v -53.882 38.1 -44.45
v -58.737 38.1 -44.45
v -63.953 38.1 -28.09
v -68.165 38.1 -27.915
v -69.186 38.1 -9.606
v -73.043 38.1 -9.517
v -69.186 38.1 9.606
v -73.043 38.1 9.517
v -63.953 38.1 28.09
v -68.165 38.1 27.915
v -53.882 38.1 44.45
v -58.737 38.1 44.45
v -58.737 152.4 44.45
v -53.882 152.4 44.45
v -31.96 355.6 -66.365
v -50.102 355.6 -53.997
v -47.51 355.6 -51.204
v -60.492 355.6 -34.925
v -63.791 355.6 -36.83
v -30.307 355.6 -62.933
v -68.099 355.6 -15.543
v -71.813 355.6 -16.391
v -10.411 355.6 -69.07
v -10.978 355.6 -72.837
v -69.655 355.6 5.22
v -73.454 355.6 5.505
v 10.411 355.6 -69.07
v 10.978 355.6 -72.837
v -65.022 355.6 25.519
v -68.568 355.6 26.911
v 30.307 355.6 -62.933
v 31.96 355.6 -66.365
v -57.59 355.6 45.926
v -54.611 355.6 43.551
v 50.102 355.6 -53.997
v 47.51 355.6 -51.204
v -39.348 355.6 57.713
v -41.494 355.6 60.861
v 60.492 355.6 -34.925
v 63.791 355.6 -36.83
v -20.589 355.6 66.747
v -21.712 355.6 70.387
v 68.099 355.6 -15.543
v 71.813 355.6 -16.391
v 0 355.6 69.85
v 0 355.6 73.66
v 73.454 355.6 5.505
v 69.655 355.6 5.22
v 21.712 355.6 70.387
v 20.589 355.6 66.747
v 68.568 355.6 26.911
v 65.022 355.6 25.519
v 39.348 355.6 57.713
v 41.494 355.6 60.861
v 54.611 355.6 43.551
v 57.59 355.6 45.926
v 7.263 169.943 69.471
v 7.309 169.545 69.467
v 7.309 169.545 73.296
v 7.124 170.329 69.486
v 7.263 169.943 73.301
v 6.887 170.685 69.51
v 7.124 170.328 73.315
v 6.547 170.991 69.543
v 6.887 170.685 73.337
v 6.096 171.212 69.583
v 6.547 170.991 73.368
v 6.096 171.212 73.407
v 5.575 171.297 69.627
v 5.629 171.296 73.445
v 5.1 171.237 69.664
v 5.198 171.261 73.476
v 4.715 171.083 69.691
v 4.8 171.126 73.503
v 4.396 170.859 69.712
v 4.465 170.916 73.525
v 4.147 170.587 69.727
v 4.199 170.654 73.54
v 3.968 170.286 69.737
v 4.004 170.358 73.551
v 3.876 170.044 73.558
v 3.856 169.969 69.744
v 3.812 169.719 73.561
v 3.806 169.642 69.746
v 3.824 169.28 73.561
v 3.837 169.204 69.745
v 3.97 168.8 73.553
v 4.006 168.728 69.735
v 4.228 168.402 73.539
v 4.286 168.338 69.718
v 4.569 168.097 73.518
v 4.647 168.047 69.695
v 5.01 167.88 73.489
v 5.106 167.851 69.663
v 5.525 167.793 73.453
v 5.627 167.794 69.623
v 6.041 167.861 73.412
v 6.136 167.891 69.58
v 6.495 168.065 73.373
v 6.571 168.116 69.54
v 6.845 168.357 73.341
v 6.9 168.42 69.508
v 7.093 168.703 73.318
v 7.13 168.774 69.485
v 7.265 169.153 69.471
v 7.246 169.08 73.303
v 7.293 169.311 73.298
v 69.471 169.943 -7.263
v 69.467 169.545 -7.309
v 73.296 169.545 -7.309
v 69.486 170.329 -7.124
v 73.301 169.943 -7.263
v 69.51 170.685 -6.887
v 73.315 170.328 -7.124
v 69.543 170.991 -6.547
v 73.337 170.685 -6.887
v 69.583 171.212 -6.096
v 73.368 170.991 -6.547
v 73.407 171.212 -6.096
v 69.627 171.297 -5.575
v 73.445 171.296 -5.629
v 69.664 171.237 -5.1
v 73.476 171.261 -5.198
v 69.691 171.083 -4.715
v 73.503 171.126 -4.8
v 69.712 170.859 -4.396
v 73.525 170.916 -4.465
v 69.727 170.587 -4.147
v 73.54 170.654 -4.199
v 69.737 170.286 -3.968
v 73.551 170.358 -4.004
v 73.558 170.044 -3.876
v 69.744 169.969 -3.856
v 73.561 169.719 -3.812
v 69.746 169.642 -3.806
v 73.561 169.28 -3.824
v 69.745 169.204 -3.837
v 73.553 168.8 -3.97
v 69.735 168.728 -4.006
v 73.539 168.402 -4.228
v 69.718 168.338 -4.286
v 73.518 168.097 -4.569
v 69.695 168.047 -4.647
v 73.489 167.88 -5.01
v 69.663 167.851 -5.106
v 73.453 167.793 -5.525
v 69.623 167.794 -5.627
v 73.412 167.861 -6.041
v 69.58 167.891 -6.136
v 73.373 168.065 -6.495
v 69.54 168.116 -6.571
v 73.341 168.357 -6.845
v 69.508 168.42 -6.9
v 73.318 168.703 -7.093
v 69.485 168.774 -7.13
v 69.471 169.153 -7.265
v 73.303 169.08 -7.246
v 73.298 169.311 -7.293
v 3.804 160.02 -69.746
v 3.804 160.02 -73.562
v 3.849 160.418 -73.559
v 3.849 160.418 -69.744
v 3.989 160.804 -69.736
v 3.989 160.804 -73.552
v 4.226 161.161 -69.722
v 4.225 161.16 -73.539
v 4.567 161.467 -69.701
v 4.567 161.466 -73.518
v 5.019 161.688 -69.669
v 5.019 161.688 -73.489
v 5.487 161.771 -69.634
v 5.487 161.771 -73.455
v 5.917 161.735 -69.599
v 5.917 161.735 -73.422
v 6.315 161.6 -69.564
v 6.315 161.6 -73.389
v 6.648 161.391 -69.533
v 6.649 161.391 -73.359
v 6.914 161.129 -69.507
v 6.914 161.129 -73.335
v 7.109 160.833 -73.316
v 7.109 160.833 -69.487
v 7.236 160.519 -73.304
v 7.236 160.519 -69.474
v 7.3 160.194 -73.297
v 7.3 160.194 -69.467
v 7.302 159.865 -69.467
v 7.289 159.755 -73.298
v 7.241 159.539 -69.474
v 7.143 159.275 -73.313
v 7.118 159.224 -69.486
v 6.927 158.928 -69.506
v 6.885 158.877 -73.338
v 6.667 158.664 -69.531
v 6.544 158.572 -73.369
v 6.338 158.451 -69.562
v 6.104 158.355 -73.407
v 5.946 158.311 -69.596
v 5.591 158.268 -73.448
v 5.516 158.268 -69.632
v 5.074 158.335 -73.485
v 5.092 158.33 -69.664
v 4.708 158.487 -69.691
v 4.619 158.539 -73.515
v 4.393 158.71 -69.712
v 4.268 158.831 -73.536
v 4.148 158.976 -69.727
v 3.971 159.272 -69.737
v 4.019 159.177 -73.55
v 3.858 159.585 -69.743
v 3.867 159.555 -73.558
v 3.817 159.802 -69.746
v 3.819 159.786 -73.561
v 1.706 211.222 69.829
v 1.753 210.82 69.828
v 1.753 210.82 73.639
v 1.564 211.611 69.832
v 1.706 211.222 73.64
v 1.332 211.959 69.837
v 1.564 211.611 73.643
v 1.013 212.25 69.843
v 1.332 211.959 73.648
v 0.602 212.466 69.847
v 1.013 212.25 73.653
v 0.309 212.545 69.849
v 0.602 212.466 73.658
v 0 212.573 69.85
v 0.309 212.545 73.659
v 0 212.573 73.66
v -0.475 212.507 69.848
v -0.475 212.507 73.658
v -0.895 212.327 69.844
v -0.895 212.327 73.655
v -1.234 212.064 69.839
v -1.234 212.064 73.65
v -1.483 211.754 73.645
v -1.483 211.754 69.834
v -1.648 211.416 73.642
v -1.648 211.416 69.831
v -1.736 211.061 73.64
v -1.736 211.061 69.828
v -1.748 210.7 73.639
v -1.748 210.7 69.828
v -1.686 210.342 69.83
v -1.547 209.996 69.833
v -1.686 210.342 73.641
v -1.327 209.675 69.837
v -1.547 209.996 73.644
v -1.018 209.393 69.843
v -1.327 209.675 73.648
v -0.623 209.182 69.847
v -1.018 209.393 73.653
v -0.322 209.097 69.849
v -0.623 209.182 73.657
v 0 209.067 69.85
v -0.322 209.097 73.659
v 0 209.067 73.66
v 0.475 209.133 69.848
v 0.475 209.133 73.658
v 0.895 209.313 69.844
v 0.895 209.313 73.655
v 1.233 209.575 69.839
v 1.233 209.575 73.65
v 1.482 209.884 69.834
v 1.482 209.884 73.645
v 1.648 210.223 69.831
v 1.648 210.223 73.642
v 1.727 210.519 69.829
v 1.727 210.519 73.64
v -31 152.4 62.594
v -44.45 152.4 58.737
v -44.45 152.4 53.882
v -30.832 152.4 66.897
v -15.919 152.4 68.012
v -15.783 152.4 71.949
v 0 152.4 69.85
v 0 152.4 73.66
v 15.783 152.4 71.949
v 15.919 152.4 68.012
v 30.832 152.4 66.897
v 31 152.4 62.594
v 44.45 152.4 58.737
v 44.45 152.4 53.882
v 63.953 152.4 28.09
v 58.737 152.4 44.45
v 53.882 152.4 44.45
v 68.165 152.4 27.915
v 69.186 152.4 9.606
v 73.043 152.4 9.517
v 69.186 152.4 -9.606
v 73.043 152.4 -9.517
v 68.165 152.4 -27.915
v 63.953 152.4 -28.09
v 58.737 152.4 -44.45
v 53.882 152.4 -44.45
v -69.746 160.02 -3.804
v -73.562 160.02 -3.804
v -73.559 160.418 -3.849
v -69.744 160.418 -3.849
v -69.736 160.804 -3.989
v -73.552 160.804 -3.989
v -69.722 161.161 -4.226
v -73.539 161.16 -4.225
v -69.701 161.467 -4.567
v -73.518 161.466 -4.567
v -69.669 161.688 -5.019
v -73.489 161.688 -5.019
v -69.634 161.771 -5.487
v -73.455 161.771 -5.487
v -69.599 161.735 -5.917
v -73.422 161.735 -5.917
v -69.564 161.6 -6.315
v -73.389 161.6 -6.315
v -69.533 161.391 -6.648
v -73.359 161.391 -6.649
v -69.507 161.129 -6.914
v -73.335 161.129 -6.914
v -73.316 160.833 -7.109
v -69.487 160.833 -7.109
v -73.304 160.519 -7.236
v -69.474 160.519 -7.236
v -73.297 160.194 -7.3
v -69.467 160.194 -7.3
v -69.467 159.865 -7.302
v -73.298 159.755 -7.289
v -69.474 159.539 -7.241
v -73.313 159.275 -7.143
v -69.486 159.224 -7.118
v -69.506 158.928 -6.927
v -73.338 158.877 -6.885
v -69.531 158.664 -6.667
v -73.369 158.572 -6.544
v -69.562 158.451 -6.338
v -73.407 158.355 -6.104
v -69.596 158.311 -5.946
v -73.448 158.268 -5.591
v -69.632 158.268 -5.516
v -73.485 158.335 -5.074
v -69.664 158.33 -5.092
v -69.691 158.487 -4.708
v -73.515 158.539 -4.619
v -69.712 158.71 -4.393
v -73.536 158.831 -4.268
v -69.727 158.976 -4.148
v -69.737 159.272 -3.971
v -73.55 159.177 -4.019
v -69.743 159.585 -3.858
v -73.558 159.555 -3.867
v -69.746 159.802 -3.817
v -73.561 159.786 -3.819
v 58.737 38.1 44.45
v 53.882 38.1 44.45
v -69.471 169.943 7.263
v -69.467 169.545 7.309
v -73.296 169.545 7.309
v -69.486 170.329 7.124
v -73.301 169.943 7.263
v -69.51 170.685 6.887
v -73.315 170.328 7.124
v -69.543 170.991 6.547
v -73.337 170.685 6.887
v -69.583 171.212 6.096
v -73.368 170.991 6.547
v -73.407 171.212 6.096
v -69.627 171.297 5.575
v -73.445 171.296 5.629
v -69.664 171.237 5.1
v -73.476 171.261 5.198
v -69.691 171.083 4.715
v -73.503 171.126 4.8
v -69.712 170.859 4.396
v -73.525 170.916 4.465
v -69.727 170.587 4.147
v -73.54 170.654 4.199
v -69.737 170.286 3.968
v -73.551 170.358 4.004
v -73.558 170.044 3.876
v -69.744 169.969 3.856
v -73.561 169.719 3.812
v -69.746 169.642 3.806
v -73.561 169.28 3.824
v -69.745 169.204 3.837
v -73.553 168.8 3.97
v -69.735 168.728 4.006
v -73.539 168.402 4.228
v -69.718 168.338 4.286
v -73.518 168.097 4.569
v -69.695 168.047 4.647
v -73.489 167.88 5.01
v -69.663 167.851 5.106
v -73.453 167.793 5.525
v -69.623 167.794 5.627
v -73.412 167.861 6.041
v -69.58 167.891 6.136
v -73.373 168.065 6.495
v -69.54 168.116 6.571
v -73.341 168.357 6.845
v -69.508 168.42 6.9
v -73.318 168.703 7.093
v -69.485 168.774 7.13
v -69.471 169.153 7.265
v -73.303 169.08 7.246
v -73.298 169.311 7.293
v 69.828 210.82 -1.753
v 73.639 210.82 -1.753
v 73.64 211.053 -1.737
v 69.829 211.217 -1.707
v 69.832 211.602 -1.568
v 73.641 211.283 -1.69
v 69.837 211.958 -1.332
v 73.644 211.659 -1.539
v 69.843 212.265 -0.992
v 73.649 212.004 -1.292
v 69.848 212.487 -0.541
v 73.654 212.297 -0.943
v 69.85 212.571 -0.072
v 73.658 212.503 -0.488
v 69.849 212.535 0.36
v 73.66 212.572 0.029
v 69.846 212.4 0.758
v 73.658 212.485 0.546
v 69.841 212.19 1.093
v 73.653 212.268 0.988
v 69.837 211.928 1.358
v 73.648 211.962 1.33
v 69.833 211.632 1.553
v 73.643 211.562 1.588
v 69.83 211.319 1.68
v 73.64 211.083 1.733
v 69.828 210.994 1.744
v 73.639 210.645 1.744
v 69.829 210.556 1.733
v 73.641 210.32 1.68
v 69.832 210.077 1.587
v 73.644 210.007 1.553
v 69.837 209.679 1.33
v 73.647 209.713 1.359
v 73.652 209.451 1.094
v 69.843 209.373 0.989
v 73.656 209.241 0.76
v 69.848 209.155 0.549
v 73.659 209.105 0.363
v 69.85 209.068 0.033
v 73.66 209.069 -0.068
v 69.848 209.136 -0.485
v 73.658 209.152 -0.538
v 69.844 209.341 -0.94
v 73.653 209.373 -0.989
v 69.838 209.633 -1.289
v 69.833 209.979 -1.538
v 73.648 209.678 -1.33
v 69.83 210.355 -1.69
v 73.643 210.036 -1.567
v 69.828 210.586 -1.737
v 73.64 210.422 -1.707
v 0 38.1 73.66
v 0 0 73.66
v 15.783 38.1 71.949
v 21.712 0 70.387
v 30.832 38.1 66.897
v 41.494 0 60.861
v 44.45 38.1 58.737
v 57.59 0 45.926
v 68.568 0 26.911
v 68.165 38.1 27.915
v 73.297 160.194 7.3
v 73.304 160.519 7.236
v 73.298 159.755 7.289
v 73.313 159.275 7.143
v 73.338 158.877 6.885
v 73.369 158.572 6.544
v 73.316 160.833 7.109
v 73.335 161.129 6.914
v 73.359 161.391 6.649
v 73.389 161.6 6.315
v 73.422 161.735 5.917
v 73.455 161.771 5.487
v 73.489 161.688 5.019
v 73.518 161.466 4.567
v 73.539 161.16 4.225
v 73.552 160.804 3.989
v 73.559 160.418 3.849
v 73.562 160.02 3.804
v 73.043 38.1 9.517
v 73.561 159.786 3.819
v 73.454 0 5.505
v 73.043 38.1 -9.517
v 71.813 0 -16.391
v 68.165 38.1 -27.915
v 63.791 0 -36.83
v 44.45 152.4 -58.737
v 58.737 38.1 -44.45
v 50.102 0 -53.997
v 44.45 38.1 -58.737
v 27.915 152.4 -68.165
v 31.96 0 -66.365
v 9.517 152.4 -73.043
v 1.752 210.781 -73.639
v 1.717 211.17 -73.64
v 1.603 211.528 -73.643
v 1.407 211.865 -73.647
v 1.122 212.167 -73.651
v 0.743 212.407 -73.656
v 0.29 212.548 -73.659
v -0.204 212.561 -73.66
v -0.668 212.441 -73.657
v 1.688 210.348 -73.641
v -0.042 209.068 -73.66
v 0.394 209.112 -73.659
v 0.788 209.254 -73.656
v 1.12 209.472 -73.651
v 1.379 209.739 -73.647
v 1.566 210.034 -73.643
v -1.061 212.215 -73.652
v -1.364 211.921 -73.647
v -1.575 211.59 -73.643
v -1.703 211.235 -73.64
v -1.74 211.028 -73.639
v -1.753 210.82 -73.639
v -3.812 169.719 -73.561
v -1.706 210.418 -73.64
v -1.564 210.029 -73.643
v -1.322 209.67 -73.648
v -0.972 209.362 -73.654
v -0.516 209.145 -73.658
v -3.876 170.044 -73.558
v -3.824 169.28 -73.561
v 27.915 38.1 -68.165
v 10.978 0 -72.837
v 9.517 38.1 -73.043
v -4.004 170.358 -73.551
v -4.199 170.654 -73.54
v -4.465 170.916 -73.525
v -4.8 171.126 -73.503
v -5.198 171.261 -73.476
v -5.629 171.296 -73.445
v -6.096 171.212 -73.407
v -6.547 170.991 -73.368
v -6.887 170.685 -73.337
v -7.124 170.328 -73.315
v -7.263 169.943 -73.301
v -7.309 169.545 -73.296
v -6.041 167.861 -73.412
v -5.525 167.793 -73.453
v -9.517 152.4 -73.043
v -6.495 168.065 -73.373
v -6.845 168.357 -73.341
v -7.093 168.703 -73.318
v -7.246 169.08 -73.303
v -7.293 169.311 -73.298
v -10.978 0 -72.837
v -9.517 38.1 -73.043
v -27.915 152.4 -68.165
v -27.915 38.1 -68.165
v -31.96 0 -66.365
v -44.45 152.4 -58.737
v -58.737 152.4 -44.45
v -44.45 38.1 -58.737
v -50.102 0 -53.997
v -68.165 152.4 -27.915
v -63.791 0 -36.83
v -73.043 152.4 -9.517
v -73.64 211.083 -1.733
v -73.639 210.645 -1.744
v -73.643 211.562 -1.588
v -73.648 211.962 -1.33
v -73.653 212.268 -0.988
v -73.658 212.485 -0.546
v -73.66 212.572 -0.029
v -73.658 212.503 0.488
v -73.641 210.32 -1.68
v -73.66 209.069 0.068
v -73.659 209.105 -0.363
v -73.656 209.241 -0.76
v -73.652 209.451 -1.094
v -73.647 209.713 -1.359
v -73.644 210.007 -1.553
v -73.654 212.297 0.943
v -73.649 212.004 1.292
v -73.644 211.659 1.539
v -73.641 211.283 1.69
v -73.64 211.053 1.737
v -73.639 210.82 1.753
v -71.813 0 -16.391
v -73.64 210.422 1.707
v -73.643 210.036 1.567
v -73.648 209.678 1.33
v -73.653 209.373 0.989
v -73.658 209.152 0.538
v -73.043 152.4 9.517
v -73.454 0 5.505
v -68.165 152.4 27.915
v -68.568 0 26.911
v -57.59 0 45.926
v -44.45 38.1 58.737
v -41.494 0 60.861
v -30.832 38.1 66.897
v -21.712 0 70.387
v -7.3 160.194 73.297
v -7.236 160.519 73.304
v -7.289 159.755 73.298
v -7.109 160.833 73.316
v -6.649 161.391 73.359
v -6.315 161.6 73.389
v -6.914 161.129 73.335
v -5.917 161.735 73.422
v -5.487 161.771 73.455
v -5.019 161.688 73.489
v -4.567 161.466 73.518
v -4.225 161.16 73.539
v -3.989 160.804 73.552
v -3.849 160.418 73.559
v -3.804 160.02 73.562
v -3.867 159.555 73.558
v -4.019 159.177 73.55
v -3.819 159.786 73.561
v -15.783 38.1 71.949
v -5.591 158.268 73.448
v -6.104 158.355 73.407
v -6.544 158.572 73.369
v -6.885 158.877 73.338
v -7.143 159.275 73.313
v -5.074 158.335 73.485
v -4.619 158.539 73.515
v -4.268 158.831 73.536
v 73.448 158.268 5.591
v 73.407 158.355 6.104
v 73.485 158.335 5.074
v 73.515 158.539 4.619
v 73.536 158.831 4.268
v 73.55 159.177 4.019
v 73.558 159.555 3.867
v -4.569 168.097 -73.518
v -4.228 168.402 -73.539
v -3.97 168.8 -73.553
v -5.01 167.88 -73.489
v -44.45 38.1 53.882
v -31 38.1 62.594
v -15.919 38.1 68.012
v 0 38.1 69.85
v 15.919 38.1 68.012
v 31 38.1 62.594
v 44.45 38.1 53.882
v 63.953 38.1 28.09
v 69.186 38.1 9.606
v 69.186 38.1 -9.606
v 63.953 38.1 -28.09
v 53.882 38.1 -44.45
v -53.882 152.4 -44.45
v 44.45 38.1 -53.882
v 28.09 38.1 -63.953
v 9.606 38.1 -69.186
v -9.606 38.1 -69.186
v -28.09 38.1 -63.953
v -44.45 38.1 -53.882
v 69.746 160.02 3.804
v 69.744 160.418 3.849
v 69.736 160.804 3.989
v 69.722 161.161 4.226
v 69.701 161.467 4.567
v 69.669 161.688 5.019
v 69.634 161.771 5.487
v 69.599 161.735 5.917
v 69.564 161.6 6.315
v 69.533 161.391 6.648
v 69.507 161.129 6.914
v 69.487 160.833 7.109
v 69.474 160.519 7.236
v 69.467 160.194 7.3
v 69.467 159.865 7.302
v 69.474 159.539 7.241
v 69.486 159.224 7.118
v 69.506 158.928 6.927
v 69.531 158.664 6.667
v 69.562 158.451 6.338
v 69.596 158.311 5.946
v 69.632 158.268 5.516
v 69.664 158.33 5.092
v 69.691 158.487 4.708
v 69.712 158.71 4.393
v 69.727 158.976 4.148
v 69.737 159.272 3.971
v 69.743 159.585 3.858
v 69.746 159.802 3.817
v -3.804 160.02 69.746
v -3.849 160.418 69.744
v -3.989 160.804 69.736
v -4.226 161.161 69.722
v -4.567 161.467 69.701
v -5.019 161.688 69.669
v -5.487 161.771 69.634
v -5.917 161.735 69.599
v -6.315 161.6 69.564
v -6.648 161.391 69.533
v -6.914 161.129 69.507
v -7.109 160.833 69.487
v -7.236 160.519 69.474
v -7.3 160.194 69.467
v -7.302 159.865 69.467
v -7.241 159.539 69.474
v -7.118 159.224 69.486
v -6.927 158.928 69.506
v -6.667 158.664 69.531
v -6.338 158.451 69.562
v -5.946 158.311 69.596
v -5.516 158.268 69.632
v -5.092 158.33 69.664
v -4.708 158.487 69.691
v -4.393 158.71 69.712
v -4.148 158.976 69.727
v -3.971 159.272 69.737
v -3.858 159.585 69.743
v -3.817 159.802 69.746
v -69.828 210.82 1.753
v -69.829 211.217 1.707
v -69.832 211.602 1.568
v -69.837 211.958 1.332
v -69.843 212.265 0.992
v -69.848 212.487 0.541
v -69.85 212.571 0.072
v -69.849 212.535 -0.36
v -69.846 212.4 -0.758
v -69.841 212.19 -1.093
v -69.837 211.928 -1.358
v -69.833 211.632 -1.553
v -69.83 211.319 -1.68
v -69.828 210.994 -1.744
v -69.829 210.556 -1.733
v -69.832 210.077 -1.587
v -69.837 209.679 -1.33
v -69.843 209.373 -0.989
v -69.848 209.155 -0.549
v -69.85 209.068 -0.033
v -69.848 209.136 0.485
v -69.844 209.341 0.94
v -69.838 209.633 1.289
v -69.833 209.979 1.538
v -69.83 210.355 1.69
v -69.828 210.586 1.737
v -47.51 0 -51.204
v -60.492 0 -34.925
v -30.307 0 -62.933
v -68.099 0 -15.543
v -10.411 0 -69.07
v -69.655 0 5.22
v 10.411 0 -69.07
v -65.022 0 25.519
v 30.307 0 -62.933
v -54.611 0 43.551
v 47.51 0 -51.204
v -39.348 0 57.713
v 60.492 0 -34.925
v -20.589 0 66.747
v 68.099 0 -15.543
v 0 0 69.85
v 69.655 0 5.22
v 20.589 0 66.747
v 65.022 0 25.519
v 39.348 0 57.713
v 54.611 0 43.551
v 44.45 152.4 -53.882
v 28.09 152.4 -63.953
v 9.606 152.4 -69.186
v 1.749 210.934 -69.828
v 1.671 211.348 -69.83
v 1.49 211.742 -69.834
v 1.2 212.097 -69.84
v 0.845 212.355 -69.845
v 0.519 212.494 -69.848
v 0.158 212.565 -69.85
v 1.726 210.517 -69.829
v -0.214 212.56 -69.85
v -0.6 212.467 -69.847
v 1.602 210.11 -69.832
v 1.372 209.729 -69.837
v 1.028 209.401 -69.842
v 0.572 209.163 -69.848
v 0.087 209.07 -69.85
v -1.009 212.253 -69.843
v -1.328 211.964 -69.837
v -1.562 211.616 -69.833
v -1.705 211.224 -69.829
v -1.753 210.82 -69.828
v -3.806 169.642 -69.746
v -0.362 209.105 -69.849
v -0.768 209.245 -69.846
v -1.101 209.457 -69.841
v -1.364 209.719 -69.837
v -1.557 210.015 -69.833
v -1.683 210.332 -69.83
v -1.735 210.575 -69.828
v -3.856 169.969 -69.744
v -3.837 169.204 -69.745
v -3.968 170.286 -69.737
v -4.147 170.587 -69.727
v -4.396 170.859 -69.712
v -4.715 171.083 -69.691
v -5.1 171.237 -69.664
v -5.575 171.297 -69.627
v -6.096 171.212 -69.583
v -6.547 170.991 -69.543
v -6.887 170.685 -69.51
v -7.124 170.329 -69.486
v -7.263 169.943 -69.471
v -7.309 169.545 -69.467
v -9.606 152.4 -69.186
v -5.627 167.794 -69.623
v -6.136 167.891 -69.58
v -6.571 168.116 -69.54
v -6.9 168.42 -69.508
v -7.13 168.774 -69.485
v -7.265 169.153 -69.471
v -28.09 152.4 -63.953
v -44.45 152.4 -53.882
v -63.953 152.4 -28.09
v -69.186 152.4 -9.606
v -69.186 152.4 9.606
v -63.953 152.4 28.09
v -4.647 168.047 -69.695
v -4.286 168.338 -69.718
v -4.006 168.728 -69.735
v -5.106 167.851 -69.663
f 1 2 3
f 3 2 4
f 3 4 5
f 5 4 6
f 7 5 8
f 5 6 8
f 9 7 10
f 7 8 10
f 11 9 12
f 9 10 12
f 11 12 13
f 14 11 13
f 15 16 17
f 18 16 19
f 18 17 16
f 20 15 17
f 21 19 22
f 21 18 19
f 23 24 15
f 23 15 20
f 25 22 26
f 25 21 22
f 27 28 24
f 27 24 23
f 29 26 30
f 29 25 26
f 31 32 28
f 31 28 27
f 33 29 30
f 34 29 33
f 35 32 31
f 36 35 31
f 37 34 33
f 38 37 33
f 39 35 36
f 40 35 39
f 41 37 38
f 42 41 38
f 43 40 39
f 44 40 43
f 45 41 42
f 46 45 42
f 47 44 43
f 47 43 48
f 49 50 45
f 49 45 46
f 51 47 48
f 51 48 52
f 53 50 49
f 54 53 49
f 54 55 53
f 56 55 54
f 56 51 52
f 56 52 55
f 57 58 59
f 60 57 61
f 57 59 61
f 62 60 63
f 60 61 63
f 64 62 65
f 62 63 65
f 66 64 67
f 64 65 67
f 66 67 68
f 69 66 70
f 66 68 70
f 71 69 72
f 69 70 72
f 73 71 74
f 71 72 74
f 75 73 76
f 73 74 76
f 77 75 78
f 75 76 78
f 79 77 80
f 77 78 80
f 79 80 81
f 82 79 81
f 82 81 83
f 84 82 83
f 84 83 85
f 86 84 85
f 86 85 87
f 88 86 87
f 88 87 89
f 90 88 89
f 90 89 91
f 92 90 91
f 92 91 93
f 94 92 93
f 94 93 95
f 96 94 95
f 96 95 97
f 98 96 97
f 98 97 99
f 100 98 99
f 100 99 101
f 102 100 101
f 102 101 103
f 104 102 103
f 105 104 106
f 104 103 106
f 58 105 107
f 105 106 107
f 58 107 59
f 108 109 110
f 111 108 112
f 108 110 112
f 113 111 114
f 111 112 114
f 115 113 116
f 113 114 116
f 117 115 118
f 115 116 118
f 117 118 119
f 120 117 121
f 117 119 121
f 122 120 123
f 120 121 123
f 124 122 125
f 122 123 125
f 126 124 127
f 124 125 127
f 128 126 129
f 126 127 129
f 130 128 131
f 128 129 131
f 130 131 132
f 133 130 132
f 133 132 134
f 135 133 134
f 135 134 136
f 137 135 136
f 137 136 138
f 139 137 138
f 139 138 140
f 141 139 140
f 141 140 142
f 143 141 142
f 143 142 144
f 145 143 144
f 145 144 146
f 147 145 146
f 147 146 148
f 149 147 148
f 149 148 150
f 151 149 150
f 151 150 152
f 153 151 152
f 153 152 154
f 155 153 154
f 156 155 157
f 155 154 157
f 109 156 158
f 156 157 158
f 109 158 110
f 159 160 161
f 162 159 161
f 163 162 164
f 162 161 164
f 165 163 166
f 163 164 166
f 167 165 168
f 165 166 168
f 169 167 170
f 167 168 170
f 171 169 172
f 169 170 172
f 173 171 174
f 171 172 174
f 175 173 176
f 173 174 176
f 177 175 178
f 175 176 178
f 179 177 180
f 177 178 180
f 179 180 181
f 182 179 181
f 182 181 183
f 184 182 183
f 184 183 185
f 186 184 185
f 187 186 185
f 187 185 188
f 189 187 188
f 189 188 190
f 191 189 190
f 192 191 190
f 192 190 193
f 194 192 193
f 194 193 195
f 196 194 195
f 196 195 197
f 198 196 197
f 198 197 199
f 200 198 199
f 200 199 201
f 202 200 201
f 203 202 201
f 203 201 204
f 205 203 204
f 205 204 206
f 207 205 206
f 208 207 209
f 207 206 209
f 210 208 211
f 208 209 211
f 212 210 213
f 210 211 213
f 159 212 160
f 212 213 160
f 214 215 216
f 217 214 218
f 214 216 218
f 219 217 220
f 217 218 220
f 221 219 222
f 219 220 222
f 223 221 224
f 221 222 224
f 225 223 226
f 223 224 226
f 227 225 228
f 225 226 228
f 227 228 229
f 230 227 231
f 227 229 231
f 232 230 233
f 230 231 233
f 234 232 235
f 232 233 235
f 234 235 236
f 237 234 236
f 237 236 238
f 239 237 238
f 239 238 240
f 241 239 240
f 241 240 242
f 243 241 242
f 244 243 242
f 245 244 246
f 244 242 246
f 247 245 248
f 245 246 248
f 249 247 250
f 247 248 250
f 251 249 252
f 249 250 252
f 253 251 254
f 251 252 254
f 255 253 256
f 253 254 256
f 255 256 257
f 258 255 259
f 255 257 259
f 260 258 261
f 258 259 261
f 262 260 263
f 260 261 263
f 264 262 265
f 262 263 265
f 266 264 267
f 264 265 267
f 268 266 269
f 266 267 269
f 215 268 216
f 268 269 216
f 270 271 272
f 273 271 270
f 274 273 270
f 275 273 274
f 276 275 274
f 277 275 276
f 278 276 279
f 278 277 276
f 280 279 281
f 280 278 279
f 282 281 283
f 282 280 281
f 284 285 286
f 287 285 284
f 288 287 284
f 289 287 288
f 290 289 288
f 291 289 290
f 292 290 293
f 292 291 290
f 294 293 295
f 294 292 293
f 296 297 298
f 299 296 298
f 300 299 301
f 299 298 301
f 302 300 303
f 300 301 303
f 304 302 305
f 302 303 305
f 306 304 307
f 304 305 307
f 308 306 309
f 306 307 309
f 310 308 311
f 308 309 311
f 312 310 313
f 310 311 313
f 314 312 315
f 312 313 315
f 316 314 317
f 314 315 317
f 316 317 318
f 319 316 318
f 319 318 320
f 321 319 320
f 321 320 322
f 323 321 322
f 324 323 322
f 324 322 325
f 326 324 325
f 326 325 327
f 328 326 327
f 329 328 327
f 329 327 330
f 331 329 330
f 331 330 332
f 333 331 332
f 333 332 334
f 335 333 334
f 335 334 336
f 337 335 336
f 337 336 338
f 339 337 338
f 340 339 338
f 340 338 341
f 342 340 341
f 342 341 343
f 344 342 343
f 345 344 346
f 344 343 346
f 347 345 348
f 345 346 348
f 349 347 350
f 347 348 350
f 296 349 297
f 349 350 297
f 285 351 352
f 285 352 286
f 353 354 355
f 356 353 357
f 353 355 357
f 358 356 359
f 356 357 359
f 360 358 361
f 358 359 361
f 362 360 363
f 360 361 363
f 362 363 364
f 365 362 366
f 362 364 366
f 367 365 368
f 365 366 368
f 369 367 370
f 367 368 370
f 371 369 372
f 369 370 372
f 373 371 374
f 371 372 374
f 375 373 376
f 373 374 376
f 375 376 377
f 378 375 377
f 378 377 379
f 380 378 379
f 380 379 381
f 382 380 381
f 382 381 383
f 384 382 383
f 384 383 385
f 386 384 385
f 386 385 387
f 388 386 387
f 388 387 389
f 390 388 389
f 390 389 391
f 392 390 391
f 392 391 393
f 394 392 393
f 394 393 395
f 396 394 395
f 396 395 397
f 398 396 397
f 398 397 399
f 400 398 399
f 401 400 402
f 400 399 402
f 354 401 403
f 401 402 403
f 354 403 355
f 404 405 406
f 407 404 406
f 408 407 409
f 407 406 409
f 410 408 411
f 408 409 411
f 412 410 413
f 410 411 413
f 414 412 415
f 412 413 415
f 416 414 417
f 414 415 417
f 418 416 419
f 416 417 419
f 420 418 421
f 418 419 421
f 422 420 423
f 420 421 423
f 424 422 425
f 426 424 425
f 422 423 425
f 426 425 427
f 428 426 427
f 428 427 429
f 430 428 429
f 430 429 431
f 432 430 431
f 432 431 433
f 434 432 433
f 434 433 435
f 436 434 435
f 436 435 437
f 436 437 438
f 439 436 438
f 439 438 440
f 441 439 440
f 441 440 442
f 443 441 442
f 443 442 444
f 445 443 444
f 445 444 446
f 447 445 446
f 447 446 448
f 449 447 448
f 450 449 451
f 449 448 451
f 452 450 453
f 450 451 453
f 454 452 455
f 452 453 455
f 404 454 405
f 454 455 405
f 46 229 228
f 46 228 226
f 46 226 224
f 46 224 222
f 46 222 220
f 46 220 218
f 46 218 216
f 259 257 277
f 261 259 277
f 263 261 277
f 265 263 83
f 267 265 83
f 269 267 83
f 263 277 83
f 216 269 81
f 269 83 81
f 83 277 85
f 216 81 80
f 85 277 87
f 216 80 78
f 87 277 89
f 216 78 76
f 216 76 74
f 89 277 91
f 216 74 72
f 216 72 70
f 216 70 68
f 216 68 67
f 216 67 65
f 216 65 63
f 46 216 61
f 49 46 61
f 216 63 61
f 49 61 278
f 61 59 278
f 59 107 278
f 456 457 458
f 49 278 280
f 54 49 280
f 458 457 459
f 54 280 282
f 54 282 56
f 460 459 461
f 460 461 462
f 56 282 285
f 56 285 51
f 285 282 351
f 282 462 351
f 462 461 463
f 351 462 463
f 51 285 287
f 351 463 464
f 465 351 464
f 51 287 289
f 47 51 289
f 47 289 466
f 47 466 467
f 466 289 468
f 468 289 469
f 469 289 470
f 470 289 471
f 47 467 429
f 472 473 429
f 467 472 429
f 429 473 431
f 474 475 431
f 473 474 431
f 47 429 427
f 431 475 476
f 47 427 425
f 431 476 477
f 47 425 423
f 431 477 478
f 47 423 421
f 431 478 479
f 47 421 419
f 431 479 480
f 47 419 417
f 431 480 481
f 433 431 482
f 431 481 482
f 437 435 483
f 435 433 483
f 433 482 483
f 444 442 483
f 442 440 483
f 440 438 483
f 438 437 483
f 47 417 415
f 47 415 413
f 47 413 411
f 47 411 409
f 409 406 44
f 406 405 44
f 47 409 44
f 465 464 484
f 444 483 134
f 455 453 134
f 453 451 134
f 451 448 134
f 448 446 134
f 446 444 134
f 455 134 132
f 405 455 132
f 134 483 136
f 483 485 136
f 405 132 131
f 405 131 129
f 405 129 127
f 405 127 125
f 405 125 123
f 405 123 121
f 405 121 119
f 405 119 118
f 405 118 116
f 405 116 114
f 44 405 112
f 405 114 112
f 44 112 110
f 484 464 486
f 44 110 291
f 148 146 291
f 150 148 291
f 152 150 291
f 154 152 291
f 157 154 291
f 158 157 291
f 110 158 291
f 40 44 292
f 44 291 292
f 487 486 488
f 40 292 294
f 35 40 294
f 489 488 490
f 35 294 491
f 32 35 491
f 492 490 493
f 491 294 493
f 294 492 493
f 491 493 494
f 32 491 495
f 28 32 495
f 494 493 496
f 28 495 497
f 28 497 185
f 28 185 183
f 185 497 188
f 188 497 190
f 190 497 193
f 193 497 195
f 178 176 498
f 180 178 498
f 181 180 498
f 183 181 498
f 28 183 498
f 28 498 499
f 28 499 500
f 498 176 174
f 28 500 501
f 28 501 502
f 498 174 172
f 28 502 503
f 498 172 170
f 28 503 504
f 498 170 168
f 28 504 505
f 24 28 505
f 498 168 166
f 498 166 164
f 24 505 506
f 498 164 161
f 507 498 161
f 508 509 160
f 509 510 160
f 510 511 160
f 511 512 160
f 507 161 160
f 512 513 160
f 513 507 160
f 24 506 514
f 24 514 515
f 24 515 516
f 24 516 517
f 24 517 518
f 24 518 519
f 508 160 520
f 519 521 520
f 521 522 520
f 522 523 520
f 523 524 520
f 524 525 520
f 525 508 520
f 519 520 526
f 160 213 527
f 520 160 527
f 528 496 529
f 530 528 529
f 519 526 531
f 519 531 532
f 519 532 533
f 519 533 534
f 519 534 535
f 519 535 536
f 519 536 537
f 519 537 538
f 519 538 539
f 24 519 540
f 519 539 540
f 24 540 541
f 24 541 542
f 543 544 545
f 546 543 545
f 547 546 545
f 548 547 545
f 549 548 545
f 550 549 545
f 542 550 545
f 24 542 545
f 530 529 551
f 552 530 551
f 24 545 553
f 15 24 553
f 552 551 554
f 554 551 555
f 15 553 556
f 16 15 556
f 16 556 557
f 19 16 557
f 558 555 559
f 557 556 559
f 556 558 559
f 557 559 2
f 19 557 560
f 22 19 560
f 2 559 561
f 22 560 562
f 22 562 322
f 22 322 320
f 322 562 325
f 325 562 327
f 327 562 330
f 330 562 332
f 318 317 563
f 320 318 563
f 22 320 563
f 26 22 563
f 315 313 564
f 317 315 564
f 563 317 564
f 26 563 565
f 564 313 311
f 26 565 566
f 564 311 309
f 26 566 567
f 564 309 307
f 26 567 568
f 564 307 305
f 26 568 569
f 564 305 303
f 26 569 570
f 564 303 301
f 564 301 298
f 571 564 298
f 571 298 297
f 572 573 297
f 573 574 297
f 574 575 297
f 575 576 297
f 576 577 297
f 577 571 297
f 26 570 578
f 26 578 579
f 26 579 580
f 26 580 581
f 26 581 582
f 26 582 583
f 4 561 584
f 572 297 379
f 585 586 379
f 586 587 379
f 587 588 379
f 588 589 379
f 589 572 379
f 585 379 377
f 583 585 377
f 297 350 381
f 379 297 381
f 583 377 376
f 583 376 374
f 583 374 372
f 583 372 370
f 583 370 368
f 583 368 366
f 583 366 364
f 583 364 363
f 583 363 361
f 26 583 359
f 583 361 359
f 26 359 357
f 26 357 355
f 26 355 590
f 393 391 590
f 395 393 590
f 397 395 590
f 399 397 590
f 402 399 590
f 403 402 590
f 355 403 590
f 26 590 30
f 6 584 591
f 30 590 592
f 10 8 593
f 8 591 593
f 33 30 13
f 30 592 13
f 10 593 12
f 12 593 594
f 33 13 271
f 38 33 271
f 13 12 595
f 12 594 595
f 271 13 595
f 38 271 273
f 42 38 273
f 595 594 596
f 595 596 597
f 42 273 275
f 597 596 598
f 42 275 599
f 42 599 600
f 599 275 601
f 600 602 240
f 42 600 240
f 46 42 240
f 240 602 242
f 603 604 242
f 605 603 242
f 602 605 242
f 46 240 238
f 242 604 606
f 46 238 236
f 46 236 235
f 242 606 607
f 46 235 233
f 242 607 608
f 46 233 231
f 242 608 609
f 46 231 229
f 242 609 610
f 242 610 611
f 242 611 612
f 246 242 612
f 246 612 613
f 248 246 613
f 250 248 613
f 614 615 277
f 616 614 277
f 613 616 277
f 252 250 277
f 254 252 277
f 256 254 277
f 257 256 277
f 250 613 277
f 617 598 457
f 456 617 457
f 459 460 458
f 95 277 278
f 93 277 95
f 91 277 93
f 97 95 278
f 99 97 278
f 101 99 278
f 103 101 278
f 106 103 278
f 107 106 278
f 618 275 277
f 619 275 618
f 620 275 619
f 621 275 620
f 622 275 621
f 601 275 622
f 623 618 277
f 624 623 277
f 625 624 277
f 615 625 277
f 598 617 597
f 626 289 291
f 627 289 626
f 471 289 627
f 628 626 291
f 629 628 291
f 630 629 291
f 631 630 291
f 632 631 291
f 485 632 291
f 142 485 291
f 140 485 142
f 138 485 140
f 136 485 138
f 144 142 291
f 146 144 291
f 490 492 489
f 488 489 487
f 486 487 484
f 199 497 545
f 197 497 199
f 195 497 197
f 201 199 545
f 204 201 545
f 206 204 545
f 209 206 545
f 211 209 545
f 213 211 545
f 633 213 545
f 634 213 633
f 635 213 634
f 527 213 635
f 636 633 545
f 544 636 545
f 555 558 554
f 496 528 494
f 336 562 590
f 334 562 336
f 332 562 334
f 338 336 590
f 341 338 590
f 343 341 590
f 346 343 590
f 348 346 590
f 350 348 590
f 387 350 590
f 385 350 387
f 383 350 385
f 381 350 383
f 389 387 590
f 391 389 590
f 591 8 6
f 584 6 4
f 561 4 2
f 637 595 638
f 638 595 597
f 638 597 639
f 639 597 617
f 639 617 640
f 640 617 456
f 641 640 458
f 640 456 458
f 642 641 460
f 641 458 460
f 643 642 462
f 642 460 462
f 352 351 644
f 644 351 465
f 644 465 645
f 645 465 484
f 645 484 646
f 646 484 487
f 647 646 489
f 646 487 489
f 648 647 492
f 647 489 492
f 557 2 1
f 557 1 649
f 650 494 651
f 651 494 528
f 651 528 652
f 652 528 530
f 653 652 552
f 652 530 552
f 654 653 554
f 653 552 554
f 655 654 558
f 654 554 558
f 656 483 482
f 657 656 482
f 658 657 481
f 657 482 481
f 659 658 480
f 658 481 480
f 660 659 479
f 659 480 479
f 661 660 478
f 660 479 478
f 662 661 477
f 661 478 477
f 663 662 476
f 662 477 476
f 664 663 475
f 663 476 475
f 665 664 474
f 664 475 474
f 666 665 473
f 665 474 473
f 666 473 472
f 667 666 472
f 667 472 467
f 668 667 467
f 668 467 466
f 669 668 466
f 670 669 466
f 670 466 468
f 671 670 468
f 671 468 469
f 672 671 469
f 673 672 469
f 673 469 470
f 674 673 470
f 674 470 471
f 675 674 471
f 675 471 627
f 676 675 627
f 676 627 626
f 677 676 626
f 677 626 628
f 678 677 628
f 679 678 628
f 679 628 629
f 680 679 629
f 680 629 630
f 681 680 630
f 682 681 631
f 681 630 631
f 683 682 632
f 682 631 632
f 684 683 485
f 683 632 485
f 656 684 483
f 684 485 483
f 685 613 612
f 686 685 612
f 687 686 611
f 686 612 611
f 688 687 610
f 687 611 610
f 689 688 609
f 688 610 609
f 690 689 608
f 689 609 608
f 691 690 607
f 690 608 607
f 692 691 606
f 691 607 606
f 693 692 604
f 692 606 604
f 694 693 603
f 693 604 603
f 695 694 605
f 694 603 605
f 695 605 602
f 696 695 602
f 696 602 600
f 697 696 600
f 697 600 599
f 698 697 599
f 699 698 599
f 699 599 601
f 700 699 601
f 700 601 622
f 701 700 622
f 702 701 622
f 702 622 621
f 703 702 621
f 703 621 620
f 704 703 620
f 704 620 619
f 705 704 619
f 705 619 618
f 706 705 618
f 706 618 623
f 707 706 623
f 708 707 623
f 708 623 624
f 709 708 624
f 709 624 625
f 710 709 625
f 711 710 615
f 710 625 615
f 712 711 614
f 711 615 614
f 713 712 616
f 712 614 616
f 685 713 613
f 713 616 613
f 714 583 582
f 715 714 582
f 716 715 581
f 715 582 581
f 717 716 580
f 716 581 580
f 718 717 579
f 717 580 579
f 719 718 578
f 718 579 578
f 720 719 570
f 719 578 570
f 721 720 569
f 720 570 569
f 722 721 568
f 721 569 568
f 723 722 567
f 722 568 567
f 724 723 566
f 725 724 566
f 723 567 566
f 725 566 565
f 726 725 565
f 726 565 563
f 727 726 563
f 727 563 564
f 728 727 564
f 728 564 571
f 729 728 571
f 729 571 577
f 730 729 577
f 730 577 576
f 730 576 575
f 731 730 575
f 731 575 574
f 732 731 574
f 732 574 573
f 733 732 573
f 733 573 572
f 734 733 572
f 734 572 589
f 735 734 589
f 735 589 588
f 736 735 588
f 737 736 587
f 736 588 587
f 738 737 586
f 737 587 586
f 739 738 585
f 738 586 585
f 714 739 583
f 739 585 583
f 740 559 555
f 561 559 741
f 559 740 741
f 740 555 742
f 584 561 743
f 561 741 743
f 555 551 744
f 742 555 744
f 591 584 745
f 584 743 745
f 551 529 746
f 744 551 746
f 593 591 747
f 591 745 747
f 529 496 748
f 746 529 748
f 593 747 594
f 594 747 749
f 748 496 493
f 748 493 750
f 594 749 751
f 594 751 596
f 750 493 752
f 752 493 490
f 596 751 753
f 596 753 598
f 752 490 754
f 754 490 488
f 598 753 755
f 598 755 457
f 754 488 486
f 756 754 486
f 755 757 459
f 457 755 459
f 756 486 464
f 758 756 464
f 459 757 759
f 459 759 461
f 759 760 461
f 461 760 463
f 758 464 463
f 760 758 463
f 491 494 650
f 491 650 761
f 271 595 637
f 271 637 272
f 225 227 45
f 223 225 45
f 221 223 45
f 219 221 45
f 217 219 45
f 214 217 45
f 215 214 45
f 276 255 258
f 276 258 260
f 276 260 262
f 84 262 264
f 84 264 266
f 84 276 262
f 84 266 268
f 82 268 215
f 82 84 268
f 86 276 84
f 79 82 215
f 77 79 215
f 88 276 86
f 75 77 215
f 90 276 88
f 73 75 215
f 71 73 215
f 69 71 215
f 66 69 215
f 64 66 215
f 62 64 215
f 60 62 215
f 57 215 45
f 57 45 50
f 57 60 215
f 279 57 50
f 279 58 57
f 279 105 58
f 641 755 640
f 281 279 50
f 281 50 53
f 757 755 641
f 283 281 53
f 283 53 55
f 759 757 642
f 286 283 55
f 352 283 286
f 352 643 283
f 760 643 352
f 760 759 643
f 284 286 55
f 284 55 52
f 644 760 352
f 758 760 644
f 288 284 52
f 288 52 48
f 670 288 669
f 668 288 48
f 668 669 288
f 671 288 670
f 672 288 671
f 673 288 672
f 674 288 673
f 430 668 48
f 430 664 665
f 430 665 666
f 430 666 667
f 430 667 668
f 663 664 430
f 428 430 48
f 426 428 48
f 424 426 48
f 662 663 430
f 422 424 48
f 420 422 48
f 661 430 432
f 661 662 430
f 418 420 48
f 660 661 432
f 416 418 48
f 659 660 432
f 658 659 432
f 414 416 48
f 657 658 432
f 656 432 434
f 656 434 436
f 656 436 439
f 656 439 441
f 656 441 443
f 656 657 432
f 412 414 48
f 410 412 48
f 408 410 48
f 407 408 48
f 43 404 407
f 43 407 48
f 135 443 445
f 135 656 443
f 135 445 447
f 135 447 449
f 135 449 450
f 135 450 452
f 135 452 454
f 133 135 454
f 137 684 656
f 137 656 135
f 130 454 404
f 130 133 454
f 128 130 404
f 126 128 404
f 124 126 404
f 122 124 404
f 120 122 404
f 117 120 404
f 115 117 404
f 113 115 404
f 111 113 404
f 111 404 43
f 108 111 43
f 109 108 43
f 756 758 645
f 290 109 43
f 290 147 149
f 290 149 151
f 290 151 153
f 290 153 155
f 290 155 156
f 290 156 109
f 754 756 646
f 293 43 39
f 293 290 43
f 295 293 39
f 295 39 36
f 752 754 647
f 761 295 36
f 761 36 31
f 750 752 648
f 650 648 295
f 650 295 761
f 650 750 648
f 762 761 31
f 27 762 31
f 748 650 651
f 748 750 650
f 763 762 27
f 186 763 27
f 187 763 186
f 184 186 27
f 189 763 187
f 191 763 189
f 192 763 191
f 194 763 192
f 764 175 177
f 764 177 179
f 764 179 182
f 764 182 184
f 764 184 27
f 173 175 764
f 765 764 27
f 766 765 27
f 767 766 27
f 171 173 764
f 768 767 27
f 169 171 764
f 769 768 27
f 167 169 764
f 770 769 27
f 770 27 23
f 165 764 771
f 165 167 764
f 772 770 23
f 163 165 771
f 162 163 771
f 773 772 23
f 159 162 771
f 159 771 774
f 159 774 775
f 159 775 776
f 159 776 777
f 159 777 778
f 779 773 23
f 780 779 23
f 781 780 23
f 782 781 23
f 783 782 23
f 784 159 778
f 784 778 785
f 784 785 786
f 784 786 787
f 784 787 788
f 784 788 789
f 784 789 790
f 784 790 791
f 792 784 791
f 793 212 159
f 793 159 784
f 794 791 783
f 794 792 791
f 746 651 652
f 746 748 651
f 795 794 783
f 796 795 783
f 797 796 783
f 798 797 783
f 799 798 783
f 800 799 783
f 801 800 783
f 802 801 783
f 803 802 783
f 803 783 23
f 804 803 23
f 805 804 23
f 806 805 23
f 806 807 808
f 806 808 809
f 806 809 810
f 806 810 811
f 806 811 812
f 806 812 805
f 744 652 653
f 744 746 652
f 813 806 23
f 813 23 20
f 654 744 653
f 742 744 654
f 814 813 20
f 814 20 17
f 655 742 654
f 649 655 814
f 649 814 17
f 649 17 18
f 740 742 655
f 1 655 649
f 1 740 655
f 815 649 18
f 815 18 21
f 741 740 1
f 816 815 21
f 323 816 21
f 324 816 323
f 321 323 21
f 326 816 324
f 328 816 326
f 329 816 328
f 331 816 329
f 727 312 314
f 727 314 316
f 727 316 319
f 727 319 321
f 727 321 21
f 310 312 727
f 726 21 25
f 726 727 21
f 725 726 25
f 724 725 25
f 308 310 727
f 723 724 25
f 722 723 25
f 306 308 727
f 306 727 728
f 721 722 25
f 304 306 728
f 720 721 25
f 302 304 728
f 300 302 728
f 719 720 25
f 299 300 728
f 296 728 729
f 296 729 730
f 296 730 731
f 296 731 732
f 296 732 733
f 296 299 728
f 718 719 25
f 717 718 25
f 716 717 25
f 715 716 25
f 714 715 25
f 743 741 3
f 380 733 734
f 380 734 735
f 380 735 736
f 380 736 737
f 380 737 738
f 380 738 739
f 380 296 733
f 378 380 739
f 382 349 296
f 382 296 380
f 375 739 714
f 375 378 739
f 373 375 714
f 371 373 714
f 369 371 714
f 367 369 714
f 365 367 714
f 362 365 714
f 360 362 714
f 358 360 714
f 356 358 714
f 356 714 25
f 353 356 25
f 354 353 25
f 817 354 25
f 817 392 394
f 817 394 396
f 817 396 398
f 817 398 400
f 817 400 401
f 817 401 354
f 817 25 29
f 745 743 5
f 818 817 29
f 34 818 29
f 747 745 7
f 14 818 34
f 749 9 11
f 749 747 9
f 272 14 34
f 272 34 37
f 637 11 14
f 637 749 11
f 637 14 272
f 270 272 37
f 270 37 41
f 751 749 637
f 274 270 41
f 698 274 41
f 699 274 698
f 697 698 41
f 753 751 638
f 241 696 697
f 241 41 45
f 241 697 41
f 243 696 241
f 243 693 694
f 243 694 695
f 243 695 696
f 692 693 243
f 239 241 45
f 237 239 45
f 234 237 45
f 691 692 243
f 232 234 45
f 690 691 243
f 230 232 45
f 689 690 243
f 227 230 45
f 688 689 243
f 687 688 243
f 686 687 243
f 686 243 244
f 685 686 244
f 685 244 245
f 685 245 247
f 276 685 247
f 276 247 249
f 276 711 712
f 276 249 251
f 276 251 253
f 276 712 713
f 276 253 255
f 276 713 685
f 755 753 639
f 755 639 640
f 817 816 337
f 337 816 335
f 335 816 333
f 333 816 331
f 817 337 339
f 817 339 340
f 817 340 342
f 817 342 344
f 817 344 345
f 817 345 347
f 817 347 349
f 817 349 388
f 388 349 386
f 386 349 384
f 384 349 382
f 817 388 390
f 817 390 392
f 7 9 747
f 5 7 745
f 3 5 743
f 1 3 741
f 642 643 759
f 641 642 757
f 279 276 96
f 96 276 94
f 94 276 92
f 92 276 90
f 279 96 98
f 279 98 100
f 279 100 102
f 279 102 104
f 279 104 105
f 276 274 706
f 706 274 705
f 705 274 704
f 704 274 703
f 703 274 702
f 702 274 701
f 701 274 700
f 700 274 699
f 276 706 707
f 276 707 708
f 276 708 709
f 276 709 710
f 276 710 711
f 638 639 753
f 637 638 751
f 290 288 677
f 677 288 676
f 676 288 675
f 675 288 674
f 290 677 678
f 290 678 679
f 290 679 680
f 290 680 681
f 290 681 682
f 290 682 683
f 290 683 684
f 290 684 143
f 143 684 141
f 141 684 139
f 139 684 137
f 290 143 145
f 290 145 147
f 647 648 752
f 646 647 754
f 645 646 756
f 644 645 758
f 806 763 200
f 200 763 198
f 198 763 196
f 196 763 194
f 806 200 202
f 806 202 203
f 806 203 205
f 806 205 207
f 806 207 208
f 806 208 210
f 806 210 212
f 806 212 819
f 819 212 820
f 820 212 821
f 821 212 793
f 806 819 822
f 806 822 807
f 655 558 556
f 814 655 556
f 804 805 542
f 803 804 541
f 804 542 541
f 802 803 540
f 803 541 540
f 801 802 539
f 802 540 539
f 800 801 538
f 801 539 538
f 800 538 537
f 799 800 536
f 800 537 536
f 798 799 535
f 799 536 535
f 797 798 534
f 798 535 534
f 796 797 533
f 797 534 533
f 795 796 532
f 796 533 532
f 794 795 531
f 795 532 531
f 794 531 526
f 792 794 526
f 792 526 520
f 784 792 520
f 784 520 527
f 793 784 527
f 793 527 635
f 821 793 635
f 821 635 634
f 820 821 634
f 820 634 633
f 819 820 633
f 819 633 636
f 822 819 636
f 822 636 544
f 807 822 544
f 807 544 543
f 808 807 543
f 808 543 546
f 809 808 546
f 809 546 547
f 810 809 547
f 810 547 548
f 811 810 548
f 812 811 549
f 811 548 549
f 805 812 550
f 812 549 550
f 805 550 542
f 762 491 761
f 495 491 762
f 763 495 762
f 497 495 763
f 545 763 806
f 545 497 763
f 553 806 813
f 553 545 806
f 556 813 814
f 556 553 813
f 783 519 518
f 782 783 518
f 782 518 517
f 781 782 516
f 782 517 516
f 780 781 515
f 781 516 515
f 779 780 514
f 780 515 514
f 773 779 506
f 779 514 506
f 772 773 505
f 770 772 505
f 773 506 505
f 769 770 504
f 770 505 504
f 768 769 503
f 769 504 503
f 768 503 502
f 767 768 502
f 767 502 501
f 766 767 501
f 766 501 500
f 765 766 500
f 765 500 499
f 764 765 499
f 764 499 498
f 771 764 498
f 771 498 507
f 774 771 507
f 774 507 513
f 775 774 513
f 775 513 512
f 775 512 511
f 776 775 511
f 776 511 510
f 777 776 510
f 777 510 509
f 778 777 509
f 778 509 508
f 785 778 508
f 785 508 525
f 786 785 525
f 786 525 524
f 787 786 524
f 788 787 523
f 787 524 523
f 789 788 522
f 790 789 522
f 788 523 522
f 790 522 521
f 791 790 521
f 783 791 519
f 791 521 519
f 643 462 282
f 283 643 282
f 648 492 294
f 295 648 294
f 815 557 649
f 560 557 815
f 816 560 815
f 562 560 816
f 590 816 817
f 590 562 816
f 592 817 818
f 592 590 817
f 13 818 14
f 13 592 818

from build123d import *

# Parameters (mm, degrees)
SKETCH1_R           = 73.66
SKETCH1_R_2         = 69.85
BOSS_EXTRUDE1_DEPTH = 355.6
SKETCH4_W           = 88.9
SKETCH4_H           = 114.3
CUT_EXTRUDE1_DEPTH  = 76.2
CIRPATTERN1_COUNT   = 4
SKETCH5_R           = 1.7526
CUT_EXTRUDE2_DEPTH  = 76.2
CIRPATTERN2_COUNT   = 4


with BuildPart() as part:
    # Sketch1 → Boss-Extrude1 (new body)
    with BuildSketch(Plane(origin=(0, 0, 0), x_dir=(1, 0, 0), z_dir=(0, 1, 0))):
        with Locations(Location((0, 0, 0), (0, 0, 270))):
            Circle(SKETCH1_R)
        with Locations(Location((0, 0, 0), (0, 0, 270))):
            Circle(SKETCH1_R_2, mode=Mode.SUBTRACT)
    extrude(amount=BOSS_EXTRUDE1_DEPTH)

    # Sketch4 → Cut-Extrude1 (cut)
    with BuildSketch(Plane(origin=(73.66, 0, 0), x_dir=(0, 0, -1), z_dir=(1, 0, 0))):
        with Locations((0, 95.25)):
            Rectangle(SKETCH4_W, SKETCH4_H)
    cut_extrude1 = extrude(amount=-CUT_EXTRUDE1_DEPTH, mode=Mode.SUBTRACT)

    # CirPattern1: Cut-Extrude1 ×4 about axis
    cirpattern1_axis = Axis((0, 0, 0), (0, 1, 0))
    for i in range(1, CIRPATTERN1_COUNT):
        add(cut_extrude1.rotate(cirpattern1_axis, i * 360 / CIRPATTERN1_COUNT), mode=Mode.SUBTRACT)

    # Sketch5 → Cut-Extrude2 (cut)
    with BuildSketch(Plane(origin=(73.66, 0, 0), x_dir=(0, 0, -1), z_dir=(1, 0, 0))):
        with Locations((0, 210.82)):
            Circle(SKETCH5_R)
        with Locations((5.55625, 169.545)):
            Circle(SKETCH5_R)
        with Locations((-5.55625, 160.02)):
            Circle(SKETCH5_R)
    cut_extrude2 = extrude(amount=-CUT_EXTRUDE2_DEPTH, mode=Mode.SUBTRACT)

    # CirPattern2: Cut-Extrude2 ×4 about axis
    cirpattern2_axis = Axis((0, 355.6, 0), (0, -1, 0))
    for i in range(1, CIRPATTERN2_COUNT):
        add(cut_extrude2.rotate(cirpattern2_axis, i * 360 / CIRPATTERN2_COUNT), mode=Mode.SUBTRACT)


solid = part.part
